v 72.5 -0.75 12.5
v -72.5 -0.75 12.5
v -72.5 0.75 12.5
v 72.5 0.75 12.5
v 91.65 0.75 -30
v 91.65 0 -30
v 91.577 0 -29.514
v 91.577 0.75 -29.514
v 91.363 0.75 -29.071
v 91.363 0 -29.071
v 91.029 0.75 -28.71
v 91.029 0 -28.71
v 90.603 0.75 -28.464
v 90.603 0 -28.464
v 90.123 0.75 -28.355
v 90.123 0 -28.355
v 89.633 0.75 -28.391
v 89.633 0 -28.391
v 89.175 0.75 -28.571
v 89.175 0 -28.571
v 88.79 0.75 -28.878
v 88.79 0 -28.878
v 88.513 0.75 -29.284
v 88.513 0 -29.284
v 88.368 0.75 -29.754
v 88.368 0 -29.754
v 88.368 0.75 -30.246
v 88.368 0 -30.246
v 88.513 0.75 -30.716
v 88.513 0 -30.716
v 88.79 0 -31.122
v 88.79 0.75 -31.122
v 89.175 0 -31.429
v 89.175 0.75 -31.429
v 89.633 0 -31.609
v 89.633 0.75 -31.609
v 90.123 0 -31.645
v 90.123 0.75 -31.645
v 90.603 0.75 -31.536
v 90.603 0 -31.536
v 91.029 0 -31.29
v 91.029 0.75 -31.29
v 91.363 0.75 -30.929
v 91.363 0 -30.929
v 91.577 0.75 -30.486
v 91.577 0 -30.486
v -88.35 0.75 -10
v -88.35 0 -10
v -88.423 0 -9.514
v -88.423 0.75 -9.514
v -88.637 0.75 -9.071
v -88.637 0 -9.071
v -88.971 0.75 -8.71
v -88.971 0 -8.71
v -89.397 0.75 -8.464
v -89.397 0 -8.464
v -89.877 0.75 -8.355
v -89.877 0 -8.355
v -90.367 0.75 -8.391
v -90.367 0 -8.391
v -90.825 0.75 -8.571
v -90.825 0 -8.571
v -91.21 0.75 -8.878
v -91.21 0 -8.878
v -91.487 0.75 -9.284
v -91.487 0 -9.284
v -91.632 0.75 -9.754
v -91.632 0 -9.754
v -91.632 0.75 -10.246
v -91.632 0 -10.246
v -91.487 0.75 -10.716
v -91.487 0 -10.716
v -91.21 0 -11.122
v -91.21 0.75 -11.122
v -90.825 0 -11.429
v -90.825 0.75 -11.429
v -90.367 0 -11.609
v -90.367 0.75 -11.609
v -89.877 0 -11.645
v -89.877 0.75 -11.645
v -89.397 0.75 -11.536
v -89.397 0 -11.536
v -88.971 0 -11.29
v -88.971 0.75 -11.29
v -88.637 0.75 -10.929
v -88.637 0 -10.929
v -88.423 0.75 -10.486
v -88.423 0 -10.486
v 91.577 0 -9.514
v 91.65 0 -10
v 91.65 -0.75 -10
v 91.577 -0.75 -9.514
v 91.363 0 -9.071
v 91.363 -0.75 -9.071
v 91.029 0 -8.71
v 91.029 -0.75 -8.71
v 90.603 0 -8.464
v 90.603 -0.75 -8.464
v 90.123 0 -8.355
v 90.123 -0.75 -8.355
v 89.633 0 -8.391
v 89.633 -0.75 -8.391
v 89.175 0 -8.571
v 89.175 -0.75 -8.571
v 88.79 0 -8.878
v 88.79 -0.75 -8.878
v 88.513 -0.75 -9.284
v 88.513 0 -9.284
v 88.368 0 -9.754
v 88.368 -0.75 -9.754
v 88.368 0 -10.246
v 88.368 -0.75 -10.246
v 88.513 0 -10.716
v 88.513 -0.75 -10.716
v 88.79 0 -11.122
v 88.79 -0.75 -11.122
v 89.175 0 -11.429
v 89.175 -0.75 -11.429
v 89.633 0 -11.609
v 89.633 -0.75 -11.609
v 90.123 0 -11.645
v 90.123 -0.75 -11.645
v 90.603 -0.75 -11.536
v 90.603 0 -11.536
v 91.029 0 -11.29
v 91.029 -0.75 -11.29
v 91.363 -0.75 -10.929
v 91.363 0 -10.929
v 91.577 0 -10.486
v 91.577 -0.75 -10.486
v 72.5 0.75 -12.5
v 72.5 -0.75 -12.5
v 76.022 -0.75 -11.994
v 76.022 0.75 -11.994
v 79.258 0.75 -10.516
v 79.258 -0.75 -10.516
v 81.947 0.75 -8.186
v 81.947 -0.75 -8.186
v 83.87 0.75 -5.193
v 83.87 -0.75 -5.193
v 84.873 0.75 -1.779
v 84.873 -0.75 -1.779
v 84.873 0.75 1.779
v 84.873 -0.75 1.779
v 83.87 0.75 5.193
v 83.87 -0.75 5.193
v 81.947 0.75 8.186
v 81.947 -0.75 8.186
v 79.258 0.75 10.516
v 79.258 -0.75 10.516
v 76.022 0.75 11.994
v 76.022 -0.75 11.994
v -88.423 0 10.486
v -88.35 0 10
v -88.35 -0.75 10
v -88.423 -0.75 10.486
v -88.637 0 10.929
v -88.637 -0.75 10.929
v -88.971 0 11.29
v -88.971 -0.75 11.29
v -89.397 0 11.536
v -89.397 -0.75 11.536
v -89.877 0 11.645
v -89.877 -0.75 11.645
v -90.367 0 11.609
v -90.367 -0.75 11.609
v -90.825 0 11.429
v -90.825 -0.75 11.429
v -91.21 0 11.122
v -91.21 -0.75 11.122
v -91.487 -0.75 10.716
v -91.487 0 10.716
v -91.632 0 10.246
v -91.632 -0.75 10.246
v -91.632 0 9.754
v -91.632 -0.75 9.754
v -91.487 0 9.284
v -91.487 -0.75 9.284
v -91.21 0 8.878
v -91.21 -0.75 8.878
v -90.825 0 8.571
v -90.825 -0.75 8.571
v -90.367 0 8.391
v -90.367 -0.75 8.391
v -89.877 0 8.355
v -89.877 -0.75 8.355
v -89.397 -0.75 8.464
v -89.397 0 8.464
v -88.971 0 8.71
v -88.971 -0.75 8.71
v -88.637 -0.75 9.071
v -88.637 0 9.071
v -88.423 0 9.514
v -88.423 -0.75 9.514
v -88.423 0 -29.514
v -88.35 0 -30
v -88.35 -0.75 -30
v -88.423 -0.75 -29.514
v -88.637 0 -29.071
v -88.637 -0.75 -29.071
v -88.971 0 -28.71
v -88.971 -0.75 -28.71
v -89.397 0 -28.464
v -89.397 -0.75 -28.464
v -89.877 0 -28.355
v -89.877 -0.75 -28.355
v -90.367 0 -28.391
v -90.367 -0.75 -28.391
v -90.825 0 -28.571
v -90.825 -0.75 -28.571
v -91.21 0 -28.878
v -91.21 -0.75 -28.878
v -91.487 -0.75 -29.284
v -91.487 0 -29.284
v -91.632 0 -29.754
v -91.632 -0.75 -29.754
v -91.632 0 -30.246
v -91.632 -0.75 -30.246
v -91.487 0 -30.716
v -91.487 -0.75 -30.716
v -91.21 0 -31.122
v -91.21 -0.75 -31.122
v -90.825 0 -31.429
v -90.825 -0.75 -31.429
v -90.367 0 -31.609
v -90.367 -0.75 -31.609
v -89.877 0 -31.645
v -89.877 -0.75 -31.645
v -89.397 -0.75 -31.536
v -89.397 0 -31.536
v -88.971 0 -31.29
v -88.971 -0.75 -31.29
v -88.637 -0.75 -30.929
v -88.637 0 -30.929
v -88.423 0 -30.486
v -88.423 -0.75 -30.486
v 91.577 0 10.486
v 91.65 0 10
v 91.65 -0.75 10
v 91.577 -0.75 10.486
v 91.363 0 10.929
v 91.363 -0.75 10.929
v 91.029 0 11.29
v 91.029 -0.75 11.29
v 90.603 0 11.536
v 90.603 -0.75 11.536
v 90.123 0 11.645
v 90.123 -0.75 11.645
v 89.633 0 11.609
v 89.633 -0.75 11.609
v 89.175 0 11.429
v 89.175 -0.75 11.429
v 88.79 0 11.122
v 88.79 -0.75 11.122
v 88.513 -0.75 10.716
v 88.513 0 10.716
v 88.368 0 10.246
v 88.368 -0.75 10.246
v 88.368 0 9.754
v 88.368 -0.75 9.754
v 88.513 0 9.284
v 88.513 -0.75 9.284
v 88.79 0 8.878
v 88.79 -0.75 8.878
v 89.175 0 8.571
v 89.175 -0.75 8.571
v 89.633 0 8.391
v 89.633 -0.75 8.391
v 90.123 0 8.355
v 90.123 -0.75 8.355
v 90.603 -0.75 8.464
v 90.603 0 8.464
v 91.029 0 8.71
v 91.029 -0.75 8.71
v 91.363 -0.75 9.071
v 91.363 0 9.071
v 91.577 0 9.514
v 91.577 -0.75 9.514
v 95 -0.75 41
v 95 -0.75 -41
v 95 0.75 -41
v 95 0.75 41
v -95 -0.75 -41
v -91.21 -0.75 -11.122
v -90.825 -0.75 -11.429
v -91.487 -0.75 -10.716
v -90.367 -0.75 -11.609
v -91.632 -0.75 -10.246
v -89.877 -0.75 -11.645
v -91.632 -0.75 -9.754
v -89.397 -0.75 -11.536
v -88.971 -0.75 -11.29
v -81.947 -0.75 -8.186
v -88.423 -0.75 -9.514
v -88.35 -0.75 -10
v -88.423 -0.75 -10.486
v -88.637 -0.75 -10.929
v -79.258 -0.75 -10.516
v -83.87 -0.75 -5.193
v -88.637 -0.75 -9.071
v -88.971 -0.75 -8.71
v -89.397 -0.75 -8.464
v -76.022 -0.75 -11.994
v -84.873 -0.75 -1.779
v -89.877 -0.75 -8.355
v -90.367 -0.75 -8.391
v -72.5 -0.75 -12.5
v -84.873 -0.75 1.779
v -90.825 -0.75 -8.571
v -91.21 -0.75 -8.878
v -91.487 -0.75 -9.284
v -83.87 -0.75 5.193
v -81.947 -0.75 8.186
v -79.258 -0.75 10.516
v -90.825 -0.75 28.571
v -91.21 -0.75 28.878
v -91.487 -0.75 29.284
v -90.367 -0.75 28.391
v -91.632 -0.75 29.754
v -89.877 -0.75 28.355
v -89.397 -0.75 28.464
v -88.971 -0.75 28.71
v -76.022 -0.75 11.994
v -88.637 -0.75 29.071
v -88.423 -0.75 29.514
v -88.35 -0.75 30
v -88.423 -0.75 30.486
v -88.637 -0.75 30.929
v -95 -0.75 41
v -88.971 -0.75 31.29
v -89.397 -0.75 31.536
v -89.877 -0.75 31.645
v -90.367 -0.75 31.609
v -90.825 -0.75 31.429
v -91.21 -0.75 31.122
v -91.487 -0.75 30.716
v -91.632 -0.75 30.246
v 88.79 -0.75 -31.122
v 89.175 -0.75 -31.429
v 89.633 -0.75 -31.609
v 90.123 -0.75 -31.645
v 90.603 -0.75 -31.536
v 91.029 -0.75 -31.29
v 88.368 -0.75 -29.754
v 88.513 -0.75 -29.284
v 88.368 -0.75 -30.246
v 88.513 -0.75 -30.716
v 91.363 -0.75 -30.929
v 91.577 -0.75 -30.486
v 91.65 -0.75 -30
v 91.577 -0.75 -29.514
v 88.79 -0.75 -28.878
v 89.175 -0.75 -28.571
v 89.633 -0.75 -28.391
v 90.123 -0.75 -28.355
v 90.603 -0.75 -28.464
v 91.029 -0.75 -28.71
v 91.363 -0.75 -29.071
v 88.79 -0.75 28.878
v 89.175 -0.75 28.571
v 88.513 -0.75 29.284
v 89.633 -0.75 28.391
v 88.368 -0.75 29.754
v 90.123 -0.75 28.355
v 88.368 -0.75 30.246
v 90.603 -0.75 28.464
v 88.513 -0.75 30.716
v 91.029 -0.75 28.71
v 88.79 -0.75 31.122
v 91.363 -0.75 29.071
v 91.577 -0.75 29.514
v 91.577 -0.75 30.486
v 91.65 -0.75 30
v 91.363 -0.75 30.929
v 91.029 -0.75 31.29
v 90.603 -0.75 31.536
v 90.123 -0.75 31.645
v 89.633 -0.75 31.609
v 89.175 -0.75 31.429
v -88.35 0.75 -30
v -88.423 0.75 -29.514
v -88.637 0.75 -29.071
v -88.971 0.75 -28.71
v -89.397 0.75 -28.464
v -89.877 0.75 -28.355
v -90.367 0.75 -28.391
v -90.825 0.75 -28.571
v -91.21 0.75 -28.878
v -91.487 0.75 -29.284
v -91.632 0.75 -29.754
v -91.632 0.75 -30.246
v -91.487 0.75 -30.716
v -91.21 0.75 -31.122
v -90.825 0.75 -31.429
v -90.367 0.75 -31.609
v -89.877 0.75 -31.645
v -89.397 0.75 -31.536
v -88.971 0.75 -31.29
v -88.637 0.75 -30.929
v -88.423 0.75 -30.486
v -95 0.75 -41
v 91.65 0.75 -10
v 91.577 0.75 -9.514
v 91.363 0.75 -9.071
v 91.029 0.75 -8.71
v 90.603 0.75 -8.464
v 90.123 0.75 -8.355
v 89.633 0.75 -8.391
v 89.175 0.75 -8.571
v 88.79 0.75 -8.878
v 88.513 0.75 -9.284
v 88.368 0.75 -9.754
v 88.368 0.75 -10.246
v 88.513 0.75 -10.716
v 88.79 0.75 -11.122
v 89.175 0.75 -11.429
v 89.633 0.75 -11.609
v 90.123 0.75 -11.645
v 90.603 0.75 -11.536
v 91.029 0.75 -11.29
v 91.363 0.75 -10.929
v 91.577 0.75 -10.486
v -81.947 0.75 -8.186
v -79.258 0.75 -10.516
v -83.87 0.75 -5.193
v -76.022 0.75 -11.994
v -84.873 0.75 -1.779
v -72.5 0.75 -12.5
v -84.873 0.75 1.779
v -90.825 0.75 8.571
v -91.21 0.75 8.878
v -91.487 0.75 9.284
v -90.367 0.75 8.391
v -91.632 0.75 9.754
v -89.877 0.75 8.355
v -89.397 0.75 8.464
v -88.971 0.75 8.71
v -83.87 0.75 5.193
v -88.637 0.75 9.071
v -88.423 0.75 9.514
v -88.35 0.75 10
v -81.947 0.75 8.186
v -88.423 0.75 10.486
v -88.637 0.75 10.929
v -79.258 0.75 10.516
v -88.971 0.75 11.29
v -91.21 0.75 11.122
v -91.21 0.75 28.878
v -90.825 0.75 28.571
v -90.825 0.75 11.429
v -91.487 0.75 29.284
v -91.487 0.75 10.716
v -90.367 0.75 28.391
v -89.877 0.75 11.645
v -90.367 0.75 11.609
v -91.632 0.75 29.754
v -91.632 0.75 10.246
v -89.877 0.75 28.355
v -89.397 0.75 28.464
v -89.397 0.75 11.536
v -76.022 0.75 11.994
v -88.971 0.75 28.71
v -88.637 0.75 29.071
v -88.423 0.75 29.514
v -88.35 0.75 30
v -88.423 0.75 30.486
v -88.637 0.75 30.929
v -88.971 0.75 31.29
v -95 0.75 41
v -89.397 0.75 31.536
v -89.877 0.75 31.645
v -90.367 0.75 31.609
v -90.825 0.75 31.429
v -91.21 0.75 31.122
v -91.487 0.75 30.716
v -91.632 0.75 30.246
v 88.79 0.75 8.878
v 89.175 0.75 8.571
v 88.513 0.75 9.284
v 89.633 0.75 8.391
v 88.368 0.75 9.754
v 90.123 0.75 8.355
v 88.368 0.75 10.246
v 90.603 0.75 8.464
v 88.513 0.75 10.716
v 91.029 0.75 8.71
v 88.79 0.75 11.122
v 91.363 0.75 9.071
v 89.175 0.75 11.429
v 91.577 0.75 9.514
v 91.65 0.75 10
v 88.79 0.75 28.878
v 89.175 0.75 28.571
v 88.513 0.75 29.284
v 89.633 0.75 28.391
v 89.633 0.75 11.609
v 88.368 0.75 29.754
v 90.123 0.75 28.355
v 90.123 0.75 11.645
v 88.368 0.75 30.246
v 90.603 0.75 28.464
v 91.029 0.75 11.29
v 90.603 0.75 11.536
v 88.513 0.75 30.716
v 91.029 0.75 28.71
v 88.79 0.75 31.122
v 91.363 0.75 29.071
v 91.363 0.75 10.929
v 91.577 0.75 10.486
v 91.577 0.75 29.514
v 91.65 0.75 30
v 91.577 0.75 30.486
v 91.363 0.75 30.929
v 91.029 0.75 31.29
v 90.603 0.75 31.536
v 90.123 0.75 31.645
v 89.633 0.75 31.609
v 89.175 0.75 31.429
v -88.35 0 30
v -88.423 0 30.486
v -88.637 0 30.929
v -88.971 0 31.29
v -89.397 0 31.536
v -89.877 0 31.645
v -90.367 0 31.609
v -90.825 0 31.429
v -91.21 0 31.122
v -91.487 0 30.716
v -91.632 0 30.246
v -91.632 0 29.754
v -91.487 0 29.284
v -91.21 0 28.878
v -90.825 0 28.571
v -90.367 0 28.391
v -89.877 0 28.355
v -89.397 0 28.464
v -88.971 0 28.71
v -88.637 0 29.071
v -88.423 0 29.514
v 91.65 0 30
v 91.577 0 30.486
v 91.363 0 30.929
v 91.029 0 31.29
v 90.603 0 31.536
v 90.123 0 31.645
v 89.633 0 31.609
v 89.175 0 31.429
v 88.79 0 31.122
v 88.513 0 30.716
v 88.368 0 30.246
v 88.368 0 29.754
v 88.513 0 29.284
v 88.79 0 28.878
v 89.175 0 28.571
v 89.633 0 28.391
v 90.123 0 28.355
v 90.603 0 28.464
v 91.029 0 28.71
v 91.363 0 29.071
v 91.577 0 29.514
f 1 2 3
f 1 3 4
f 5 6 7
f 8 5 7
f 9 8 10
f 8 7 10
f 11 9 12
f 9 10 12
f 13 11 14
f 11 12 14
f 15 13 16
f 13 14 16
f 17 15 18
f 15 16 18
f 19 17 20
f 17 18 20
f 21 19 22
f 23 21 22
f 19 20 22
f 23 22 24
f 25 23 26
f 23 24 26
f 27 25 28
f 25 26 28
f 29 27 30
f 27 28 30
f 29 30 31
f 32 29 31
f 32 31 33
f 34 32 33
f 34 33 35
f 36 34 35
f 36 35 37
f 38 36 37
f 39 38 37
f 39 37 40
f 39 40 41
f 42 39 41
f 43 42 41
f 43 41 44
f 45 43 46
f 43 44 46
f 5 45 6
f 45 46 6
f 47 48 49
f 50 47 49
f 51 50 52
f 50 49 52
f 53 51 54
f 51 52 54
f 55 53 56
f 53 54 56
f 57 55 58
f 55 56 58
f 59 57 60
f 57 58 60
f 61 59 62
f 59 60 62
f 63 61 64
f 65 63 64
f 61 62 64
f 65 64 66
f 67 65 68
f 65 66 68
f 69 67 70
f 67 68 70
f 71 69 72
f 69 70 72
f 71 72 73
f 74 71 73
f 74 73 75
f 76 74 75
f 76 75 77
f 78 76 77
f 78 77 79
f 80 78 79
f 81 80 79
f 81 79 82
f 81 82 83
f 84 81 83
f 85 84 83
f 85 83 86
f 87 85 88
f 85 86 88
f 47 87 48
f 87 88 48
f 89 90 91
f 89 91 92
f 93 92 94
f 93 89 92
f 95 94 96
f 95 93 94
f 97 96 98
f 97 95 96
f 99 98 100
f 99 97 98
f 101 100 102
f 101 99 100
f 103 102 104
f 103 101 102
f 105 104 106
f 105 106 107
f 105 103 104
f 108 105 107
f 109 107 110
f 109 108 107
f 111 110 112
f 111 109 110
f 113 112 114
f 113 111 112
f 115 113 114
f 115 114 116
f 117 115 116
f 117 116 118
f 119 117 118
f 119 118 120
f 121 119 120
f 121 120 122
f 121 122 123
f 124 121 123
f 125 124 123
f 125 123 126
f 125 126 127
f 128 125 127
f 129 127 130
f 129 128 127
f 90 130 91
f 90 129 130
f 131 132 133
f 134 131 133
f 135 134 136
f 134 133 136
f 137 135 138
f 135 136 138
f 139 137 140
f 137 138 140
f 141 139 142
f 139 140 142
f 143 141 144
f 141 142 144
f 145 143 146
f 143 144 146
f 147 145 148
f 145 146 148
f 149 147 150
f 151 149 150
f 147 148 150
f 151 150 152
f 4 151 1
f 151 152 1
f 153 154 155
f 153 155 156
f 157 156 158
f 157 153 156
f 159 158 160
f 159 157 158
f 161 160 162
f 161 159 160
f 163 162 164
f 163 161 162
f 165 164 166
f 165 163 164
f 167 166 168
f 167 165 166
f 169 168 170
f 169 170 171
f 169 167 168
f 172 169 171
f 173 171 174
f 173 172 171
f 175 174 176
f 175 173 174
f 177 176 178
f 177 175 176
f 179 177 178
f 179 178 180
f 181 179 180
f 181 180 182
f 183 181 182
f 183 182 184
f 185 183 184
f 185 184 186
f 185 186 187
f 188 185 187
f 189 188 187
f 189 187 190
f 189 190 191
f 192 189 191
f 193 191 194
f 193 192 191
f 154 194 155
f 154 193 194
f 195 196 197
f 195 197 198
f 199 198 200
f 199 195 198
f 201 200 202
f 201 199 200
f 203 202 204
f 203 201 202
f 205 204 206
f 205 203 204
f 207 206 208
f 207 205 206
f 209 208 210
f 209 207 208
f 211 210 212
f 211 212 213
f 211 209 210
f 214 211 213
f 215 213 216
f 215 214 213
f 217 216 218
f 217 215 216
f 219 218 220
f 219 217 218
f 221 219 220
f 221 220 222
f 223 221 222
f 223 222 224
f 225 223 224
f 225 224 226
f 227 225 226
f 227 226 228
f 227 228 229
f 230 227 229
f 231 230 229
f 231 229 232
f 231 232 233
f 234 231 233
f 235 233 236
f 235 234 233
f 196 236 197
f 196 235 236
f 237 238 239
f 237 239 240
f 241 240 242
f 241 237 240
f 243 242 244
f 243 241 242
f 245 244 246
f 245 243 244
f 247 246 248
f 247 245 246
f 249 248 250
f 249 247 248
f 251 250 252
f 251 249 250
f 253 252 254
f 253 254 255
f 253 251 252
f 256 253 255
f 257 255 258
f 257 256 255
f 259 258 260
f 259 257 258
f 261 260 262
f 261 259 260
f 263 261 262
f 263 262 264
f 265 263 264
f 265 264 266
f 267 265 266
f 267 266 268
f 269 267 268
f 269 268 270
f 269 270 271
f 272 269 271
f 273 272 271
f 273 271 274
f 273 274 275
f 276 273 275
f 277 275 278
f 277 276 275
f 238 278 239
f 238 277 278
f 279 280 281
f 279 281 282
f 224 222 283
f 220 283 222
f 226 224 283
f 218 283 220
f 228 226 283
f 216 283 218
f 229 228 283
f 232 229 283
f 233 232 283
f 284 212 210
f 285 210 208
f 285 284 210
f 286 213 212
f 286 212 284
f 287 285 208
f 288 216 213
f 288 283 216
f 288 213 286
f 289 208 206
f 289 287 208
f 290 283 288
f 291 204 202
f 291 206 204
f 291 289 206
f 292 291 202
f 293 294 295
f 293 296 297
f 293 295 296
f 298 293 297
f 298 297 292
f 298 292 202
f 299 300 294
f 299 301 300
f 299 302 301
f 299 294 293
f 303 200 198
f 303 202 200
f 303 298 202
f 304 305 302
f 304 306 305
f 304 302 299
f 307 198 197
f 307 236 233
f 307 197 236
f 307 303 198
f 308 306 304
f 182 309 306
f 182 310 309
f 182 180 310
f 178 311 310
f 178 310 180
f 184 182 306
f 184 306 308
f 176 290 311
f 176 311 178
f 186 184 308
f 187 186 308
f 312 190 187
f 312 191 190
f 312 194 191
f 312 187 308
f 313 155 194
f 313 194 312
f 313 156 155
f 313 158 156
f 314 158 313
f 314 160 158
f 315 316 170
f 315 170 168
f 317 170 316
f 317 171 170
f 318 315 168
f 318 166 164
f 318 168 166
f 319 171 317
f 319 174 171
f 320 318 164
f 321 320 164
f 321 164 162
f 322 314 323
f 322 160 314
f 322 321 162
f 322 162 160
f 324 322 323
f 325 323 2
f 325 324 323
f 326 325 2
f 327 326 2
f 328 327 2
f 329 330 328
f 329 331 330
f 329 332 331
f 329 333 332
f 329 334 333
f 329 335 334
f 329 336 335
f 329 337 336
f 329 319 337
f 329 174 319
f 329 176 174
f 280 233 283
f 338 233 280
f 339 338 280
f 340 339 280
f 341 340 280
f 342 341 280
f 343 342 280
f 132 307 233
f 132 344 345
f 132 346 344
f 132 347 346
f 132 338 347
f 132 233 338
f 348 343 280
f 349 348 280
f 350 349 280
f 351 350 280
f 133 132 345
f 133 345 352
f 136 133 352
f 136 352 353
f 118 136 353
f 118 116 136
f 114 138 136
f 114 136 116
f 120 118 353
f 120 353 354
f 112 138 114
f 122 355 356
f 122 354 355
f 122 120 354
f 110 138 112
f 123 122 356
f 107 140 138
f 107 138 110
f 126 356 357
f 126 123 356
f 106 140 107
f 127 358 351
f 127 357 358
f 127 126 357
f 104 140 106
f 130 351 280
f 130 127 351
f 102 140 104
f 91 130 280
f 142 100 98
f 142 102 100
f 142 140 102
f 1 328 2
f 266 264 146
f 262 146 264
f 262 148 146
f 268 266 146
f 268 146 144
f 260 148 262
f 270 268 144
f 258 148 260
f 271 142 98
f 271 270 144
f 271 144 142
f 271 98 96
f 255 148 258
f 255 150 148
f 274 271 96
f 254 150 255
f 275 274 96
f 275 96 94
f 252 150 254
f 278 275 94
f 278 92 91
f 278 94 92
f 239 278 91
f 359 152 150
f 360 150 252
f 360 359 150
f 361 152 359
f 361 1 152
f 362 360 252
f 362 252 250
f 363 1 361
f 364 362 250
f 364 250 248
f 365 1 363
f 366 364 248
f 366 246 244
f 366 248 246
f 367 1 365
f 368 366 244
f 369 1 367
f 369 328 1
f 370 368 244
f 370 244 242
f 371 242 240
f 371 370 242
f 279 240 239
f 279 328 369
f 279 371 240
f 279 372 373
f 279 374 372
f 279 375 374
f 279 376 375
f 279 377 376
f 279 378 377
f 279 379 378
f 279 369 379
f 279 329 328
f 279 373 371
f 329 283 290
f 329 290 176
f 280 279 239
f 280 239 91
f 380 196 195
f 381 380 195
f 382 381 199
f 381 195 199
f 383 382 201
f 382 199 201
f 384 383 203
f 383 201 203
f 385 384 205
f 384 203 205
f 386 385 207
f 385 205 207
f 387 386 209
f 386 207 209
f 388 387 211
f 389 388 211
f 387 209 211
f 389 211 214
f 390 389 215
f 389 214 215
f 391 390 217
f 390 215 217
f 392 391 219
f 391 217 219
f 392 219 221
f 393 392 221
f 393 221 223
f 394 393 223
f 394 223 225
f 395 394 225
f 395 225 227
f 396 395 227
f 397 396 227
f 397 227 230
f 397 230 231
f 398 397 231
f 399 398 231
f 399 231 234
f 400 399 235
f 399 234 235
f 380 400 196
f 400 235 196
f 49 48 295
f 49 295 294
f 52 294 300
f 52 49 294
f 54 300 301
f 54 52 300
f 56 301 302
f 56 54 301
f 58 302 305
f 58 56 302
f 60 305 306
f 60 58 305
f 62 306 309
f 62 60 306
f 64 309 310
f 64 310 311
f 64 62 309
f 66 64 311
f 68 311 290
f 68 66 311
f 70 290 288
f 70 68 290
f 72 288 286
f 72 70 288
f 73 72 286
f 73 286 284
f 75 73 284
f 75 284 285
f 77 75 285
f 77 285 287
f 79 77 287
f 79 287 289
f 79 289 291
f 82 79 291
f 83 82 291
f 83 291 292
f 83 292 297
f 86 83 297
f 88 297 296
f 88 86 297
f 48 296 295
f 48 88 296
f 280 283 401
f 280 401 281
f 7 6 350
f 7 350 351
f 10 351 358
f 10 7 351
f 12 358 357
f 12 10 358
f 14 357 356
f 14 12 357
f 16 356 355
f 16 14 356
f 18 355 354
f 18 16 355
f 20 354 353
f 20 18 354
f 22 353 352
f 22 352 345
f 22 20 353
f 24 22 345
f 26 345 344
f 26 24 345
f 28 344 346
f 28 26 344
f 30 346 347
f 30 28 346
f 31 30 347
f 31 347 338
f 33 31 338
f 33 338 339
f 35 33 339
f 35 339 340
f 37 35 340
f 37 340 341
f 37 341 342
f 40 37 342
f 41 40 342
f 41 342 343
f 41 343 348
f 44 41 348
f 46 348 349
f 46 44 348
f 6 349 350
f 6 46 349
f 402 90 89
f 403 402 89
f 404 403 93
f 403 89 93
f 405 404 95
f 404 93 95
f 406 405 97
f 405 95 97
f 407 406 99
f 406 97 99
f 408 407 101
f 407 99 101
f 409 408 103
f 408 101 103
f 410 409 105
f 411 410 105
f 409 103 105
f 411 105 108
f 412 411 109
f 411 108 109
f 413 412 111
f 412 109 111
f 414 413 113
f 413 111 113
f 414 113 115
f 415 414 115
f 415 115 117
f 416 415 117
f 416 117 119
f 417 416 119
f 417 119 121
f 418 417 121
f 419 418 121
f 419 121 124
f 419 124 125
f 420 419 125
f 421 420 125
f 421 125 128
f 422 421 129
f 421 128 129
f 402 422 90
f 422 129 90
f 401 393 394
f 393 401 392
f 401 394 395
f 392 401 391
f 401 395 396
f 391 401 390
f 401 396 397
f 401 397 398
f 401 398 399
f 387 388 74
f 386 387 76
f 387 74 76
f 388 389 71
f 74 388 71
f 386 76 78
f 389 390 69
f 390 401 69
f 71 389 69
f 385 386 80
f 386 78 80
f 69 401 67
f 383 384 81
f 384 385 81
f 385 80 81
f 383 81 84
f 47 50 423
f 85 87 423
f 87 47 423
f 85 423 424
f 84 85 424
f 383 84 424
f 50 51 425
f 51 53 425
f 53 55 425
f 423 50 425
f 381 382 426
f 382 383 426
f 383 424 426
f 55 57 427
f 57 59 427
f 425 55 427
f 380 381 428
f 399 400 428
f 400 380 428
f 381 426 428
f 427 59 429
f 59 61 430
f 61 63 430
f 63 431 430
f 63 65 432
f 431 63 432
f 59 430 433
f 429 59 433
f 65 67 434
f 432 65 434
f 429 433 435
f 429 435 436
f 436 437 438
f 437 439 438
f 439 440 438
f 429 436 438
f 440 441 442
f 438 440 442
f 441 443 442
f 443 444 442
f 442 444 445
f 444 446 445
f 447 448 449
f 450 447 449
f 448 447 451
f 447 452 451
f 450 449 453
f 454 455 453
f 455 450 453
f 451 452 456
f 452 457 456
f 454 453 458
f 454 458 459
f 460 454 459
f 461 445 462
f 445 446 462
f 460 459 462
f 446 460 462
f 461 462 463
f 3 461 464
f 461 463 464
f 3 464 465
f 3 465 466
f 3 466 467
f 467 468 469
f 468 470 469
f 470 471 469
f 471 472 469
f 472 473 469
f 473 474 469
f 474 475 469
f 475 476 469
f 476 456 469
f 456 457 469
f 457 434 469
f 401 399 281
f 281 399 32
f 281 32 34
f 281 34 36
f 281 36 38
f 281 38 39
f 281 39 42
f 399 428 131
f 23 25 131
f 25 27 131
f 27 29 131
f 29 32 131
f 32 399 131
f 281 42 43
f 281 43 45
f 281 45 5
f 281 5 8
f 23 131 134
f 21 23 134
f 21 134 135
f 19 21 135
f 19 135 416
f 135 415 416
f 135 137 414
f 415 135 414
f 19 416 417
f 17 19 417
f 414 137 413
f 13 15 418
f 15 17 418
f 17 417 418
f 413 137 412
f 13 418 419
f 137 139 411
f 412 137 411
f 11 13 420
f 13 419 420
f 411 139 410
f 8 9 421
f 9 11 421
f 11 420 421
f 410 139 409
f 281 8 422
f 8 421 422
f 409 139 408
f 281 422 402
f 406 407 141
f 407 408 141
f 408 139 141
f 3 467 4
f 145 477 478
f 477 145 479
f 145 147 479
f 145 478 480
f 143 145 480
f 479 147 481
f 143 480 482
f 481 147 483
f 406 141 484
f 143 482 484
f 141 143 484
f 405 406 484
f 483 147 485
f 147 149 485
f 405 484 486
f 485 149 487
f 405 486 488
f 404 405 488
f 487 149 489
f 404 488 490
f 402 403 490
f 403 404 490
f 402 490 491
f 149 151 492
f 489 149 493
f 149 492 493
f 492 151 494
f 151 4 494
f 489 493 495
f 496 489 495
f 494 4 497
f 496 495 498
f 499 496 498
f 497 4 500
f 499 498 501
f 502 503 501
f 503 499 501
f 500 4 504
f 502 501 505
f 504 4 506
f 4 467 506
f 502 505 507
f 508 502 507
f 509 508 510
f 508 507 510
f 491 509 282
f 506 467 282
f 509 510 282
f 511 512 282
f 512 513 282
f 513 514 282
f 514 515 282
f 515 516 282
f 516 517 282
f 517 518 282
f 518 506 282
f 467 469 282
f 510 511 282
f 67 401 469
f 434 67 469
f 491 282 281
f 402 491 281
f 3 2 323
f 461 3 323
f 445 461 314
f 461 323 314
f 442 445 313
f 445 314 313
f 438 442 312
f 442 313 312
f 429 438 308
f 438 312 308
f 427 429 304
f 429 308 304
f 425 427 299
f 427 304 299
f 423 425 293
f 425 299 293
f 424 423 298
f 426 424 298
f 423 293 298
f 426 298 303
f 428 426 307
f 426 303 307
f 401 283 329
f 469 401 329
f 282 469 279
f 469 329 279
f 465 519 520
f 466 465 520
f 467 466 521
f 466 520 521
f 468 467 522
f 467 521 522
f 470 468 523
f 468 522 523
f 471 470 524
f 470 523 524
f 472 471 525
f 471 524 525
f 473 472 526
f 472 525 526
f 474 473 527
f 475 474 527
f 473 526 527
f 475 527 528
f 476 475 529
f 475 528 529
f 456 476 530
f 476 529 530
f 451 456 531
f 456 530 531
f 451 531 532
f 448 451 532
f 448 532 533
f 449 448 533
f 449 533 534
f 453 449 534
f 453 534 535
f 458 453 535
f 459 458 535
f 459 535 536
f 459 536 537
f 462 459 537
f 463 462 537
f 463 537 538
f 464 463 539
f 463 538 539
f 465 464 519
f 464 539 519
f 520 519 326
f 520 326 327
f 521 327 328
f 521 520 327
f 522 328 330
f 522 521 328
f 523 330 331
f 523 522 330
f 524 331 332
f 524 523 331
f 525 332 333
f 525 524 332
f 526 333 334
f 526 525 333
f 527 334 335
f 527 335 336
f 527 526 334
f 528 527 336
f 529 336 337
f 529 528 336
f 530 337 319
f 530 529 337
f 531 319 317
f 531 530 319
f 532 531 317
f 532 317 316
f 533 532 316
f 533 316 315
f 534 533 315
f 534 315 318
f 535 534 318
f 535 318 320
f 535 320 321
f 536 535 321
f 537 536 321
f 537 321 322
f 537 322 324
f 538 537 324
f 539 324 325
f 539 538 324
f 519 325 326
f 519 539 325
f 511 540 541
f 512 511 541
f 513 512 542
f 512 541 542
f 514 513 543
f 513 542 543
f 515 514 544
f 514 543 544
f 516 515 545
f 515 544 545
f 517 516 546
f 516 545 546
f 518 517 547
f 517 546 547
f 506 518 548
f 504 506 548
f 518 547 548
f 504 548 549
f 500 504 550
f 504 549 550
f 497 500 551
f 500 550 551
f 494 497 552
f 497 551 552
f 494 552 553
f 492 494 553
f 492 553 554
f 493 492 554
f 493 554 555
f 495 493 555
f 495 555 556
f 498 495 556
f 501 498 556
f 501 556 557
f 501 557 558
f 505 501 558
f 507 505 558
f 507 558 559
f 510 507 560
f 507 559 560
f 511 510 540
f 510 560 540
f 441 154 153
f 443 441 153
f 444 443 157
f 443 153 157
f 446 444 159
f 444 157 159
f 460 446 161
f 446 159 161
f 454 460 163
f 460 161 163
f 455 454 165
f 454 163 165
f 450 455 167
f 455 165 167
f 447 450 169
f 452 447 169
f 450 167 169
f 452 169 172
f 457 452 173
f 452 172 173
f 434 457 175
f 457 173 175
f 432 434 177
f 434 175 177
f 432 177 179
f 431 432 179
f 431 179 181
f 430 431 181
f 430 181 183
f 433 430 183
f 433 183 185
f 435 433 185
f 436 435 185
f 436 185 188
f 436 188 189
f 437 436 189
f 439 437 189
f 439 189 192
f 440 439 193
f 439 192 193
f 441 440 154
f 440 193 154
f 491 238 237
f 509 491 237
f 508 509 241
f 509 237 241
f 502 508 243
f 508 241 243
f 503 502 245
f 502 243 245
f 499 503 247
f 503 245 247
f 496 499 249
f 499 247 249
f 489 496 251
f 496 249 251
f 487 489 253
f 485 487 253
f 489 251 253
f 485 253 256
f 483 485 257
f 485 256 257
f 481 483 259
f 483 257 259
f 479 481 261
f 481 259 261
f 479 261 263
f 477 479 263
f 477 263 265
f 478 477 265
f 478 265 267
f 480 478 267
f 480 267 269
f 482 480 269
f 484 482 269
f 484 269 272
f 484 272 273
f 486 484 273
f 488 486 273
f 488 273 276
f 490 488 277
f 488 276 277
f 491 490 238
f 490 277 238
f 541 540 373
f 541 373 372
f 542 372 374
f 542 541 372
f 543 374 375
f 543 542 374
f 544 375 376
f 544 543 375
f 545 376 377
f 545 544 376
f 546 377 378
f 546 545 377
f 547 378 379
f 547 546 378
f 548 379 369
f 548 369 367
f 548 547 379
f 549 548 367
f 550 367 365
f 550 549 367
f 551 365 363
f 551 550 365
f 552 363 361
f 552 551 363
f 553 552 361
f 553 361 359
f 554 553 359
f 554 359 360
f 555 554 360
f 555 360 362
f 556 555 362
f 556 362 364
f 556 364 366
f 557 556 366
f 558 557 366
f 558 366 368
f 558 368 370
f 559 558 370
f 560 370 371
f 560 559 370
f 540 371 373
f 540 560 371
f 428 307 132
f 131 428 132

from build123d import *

# Parameters (mm, degrees)
SKETCH_W       = 190
SKETCH_H       = 82
SKETCH_R       = 1.65
PAD_DEPTH      = 0.75
PAD_DEPTH_BACK = 0.75
POCKET_DEPTH   = 2.251


with BuildPart() as part:
    # Sketch → Pad (new body, two sides)
    with BuildSketch(Plane.XZ) as pad_sk:
        Rectangle(SKETCH_W, SKETCH_H)
        with Locations((90, 30)):
            Circle(SKETCH_R, mode=Mode.SUBTRACT)
        with Locations((90, 10)):
            Circle(SKETCH_R, mode=Mode.SUBTRACT)
        with Locations((90, -30)):
            Circle(SKETCH_R, mode=Mode.SUBTRACT)
        with Locations((90, -10)):
            Circle(SKETCH_R, mode=Mode.SUBTRACT)
        with Locations((-90, 30)):
            Circle(SKETCH_R, mode=Mode.SUBTRACT)
        with Locations((-90, 10)):
            Circle(SKETCH_R, mode=Mode.SUBTRACT)
        with Locations((-90, -30)):
            Circle(SKETCH_R, mode=Mode.SUBTRACT)
        with Locations((-90, -10)):
            Circle(SKETCH_R, mode=Mode.SUBTRACT)
    extrude(amount=PAD_DEPTH)
    extrude(pad_sk.sketch, amount=-PAD_DEPTH_BACK)

    # Sketch001 → Pocket (cut, through all)
    with BuildSketch(Plane.XZ.offset(1.5)):
        with BuildLine():
            ThreePointArc((-72.5, 12.5), (-85, 0), (-72.5, -12.5))
            Line((-72.5, -12.5), (72.5, -12.5))
            ThreePointArc((72.5, -12.5), (85, 0), (72.5, 12.5))
            Line((-72.5, 12.5), (72.5, 12.5))
        make_face()
    extrude(amount=-POCKET_DEPTH, mode=Mode.SUBTRACT)


solid = part.part
